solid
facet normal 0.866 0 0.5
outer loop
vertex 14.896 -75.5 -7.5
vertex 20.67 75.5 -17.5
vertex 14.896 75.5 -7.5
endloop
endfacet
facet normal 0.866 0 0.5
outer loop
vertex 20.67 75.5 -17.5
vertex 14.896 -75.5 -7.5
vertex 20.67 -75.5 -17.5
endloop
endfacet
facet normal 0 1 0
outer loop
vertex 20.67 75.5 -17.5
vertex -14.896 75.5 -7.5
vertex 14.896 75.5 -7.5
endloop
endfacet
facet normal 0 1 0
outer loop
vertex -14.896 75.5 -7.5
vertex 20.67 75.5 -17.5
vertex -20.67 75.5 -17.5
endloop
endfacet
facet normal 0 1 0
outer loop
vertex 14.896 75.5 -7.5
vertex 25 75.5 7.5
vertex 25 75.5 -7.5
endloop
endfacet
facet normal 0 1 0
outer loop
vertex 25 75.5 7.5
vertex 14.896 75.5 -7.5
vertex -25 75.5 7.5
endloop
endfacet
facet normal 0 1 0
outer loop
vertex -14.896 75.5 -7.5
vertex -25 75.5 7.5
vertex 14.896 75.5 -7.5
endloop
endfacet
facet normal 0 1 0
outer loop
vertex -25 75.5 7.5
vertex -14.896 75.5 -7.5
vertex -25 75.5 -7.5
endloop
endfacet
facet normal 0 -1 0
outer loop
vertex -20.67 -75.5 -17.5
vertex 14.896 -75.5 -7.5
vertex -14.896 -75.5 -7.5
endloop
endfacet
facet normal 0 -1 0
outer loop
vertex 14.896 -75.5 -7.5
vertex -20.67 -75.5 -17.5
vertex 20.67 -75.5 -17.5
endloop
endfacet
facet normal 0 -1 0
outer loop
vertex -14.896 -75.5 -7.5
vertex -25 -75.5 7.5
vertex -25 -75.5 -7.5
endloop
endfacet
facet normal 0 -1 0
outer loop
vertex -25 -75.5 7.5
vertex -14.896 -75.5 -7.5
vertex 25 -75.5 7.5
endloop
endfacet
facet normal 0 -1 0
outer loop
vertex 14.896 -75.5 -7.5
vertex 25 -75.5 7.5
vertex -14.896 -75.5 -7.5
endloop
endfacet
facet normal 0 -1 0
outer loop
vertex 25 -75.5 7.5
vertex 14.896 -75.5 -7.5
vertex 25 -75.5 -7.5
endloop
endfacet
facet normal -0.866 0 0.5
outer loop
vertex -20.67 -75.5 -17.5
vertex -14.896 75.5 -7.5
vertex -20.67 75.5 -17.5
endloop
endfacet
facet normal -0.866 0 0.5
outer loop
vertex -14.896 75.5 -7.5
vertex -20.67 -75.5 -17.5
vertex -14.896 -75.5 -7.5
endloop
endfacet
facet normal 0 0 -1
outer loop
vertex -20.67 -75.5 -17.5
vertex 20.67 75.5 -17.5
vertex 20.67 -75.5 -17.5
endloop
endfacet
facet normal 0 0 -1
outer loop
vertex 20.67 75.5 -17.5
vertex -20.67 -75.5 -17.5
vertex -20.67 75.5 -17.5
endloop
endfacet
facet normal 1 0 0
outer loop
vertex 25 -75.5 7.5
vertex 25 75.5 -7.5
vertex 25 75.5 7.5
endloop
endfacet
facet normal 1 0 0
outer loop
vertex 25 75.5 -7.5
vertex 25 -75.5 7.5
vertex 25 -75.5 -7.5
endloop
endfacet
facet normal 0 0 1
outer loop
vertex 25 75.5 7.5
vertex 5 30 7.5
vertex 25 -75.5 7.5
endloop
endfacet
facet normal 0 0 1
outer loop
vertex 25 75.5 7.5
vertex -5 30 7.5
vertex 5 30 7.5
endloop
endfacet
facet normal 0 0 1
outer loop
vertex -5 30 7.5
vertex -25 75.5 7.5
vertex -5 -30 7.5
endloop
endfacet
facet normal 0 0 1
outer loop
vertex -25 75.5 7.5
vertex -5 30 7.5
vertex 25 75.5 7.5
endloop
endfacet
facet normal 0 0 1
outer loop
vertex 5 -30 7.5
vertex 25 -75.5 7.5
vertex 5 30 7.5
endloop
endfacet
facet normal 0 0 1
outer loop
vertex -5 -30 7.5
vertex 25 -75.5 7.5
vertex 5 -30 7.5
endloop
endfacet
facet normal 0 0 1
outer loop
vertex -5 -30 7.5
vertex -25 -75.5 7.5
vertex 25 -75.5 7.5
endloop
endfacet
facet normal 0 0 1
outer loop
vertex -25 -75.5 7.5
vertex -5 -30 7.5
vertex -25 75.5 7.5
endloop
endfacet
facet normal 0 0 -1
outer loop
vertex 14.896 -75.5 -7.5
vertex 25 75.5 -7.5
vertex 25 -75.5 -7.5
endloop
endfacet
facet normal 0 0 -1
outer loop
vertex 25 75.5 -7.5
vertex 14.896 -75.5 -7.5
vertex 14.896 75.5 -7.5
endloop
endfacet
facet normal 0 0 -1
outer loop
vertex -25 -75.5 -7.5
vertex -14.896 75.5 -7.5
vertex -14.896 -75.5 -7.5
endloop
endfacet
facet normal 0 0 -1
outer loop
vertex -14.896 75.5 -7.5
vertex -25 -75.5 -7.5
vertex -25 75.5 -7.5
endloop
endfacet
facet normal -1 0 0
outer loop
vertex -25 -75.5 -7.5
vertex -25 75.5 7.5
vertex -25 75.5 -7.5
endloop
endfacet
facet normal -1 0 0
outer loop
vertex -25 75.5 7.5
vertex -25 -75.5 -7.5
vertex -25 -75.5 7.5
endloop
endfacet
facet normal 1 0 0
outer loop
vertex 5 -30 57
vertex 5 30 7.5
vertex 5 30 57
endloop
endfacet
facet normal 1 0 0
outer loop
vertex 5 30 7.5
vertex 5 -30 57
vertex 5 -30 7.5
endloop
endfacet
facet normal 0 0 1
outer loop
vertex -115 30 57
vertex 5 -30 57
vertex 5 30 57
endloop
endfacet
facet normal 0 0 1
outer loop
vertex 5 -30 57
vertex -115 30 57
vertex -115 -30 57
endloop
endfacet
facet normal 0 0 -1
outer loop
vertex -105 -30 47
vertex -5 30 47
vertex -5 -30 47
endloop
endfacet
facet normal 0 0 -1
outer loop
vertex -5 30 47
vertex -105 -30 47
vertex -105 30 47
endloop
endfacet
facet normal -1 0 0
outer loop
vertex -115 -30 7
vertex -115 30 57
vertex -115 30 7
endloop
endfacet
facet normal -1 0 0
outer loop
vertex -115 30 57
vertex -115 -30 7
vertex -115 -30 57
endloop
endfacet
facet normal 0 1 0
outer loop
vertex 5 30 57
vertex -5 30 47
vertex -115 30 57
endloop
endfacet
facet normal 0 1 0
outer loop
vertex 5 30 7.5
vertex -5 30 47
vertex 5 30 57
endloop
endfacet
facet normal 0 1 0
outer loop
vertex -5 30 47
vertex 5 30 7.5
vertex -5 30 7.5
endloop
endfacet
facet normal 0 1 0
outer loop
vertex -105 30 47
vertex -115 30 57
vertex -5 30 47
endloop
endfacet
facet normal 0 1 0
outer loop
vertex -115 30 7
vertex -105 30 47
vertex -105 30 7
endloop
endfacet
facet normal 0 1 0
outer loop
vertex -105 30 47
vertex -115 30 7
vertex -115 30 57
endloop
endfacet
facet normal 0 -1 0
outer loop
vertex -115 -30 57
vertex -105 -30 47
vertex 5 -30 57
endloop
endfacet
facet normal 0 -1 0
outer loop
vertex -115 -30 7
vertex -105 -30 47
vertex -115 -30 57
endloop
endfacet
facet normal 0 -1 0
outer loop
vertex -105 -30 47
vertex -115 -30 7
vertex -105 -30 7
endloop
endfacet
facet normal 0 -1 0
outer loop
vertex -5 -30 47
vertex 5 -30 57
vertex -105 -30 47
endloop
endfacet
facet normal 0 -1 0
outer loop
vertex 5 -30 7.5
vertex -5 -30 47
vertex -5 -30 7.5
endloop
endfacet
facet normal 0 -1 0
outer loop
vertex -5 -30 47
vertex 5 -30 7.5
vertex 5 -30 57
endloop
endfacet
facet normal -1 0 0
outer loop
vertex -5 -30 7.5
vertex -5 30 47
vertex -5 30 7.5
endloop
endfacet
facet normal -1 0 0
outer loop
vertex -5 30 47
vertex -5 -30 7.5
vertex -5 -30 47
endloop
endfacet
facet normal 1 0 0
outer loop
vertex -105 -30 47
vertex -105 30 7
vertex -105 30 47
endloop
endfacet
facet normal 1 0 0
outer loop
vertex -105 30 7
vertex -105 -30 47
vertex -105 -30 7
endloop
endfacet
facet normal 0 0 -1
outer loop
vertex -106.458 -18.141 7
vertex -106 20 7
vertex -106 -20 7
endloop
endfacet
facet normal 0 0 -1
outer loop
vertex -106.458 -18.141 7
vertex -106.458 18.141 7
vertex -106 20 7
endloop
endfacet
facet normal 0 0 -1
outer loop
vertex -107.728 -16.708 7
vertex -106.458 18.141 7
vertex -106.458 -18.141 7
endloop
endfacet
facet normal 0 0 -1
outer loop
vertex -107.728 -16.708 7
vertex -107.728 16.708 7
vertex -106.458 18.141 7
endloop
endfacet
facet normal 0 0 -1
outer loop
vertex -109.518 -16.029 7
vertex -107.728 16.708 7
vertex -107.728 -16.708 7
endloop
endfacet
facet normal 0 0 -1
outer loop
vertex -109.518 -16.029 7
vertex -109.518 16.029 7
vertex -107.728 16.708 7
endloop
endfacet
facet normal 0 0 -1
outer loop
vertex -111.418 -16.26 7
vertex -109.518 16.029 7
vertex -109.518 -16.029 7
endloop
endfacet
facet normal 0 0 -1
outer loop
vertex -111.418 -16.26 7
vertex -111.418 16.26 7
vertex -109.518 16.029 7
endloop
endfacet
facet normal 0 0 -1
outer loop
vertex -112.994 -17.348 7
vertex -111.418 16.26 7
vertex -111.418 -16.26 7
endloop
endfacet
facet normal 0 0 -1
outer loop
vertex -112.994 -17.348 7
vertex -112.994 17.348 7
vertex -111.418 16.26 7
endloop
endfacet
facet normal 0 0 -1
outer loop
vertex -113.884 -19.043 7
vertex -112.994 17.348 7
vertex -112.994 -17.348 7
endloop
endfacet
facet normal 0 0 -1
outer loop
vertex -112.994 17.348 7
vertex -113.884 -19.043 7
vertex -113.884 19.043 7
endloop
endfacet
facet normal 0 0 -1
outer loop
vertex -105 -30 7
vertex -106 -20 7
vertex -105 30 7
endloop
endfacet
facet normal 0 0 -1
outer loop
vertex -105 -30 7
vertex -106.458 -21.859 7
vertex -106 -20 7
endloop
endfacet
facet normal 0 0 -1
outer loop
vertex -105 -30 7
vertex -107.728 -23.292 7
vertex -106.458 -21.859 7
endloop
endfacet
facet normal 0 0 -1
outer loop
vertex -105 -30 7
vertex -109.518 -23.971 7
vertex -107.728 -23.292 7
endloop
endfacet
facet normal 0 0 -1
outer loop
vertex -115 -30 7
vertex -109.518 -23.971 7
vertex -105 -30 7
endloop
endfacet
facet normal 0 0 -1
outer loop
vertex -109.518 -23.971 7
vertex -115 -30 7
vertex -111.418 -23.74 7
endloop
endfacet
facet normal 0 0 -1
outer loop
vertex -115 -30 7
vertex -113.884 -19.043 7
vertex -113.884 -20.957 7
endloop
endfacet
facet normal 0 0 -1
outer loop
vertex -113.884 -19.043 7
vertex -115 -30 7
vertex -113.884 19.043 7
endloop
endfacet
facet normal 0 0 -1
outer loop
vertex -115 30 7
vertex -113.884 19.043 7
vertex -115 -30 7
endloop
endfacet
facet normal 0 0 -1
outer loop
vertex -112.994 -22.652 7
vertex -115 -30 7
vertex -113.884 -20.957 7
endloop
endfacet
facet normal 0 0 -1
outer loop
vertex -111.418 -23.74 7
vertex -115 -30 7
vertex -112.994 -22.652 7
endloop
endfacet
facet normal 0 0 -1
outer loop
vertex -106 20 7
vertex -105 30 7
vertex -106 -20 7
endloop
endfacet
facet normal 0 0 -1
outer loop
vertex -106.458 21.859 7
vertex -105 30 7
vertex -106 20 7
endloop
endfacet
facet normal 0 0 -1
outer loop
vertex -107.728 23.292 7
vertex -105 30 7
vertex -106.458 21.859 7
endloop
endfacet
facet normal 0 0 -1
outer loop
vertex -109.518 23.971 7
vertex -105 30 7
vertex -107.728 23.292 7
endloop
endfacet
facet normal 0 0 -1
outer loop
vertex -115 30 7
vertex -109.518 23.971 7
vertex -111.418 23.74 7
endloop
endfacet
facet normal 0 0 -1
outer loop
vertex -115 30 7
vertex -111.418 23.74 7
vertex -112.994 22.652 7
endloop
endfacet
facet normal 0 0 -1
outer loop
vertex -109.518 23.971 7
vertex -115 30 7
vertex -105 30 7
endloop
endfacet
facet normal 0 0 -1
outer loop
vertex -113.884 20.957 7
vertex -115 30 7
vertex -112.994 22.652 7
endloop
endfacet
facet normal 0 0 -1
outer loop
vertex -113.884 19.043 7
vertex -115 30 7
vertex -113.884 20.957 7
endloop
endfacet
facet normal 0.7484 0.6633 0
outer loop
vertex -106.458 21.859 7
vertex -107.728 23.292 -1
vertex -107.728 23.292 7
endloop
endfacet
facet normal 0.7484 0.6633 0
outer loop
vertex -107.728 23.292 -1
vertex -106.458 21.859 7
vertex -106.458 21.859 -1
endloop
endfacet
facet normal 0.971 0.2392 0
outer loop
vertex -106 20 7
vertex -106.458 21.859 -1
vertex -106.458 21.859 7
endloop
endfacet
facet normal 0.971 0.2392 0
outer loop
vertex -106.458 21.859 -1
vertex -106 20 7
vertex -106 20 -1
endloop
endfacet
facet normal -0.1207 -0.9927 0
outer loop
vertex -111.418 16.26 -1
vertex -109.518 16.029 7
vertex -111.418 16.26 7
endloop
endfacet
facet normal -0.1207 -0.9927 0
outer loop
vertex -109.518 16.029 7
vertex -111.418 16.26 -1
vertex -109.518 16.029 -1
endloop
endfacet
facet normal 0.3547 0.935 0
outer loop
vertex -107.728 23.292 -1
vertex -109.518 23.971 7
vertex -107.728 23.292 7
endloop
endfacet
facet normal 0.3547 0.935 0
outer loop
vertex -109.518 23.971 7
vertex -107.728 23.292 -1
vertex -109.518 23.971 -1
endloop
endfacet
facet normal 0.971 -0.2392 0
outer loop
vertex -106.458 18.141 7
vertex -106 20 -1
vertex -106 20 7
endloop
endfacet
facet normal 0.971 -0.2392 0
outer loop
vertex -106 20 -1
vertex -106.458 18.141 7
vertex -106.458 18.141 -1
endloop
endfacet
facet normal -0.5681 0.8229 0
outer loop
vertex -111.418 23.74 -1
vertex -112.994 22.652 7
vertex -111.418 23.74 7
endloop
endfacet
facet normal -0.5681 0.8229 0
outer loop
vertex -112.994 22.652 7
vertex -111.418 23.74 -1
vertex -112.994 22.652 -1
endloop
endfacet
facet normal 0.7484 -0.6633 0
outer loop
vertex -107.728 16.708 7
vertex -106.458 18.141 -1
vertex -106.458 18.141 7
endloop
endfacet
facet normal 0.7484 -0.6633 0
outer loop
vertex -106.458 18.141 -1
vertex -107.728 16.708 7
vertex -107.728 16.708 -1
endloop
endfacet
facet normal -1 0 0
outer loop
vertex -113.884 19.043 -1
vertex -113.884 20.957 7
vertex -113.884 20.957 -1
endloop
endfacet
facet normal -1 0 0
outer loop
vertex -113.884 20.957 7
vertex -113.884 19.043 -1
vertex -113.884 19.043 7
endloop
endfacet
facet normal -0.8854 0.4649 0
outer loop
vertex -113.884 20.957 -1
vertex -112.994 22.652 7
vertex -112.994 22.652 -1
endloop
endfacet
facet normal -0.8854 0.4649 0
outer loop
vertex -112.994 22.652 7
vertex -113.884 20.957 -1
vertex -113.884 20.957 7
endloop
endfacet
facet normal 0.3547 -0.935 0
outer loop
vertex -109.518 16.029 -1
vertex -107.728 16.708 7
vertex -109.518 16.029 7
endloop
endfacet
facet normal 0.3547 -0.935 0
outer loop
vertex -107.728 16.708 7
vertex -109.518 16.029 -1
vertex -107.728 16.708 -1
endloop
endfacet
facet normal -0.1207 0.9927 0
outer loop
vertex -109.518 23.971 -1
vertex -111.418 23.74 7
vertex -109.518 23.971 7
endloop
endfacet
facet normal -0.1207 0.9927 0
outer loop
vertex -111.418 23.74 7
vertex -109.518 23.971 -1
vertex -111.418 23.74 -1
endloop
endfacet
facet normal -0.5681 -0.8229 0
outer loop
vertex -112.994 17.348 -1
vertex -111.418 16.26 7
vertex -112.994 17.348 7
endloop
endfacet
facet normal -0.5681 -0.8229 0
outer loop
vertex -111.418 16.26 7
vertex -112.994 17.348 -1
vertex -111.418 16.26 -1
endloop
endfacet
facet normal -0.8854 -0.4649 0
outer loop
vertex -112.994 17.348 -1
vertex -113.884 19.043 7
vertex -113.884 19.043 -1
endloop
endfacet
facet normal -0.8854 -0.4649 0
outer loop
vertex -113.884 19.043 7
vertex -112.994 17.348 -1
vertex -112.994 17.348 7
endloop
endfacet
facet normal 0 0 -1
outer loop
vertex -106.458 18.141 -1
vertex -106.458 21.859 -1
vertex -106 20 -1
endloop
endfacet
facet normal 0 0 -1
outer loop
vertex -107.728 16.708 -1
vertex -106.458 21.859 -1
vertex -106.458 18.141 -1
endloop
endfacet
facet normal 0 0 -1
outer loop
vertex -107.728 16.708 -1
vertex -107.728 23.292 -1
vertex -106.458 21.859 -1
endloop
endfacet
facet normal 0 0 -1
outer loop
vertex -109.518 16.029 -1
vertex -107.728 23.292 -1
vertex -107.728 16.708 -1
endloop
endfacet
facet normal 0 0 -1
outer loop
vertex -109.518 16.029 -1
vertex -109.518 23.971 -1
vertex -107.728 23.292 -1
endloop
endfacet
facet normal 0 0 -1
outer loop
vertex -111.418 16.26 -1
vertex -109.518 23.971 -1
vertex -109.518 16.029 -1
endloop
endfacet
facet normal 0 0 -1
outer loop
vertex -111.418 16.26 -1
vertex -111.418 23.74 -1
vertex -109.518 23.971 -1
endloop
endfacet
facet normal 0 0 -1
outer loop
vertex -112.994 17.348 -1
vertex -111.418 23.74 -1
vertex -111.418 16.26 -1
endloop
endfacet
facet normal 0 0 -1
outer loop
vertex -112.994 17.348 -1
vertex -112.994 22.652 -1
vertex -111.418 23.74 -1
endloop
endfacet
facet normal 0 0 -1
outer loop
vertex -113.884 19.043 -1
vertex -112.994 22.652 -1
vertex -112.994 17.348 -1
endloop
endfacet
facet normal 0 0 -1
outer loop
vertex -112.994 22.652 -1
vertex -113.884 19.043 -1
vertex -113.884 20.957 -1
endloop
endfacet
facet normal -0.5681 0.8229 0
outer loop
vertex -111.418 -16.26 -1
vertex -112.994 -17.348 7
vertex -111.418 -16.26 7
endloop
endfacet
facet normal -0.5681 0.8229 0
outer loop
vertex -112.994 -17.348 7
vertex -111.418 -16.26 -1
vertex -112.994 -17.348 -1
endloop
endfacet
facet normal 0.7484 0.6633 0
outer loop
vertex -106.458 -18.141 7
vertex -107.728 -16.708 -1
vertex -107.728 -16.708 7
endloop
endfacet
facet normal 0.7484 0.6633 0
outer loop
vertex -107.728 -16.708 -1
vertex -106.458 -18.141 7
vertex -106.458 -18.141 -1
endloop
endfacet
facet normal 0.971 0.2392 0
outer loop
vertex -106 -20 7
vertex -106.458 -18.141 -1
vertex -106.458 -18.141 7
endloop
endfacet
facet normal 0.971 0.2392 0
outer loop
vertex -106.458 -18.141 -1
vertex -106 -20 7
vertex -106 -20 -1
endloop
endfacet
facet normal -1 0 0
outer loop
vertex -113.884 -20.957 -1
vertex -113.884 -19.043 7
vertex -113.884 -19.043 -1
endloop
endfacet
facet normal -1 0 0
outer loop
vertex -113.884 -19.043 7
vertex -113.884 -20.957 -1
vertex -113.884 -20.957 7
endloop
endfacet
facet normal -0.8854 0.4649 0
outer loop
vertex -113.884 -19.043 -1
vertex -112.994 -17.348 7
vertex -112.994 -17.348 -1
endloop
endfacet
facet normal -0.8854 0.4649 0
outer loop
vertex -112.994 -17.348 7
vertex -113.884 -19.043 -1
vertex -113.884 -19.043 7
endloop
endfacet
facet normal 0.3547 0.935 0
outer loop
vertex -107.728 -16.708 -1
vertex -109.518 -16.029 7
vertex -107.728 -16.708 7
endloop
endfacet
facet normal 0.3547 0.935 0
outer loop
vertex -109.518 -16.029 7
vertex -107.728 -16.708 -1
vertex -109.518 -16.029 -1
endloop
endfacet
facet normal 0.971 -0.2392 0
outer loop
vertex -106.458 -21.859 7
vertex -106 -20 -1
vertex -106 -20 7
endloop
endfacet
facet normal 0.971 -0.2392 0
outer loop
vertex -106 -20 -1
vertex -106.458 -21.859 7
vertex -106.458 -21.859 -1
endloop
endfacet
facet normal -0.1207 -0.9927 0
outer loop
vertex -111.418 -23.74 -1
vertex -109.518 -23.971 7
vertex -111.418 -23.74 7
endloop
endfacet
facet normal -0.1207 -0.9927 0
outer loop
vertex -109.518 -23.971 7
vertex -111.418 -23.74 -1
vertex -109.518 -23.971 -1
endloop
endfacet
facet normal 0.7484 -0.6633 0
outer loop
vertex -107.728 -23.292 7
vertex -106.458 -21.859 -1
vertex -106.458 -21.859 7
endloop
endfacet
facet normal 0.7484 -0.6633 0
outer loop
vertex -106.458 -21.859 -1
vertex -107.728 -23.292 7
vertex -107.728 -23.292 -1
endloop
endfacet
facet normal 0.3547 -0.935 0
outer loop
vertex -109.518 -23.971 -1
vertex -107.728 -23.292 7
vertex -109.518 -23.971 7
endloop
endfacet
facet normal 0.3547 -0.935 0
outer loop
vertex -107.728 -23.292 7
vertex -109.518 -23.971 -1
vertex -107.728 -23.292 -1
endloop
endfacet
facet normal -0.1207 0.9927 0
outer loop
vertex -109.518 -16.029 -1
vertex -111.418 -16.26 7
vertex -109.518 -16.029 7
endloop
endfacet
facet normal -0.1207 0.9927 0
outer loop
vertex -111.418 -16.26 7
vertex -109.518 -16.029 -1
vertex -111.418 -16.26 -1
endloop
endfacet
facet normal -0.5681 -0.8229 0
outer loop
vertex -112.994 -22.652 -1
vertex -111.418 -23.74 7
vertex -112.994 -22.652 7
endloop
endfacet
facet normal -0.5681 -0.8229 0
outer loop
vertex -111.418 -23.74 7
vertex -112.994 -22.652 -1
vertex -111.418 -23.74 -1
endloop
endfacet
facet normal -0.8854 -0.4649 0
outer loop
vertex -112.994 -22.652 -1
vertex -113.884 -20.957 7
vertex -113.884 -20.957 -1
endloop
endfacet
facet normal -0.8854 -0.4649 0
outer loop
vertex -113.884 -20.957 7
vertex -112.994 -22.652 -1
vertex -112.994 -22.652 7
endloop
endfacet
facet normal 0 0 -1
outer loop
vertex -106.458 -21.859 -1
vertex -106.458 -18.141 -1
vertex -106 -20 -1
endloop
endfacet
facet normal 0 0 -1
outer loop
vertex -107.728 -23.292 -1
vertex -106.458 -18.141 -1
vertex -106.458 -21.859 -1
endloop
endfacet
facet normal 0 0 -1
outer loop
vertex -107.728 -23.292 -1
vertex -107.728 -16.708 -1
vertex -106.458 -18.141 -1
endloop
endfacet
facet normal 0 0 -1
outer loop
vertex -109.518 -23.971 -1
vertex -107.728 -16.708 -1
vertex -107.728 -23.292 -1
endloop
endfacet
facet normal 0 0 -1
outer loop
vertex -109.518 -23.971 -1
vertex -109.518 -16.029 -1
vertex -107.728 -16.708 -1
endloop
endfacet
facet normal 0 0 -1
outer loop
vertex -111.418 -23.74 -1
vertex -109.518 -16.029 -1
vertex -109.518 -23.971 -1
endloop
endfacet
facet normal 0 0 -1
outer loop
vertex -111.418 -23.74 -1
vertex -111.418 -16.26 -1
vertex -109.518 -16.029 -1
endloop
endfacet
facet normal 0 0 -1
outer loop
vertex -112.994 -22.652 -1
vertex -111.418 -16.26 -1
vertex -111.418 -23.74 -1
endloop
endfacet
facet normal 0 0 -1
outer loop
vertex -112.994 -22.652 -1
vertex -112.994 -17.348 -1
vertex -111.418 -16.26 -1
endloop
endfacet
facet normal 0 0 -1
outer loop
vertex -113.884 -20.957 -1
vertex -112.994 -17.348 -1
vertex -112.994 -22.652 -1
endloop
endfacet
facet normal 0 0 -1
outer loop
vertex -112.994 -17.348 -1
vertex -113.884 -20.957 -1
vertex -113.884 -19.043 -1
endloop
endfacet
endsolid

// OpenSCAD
module handle(){
    handlebase();
    handletop();
}
module handlebase(){
    difference(){
        union(){
//            translate([-120,0,-10]){
//                cube([10, 230, 10],center = true);
//            }
            translate([0,-0,0]){
                cube([50, 151, 15], center = true);
                handlebaseslide();
            }
        }
        handletop();
    
    }

}
module handletop(){

        union(){
            translate([-55,0,52]){
                cube([120, 60, 10],center = true);
            }
            translate([0,0,27.5]){
                cube([10,60,40],center = true);
            }
            translate([-110,0,30]){
                cube([10,60,46],center = true);
            }
            translate([0,-20,7]){
                cylinder(8, d = 8, center = true);
            }
            translate([0,20,7]){
                cylinder(8, d = 8, center = true);
            }   
            translate([-110, 20,3]){
                cylinder(8, d = 8, center = true);
            }
            translate([-110, -20, 3]){
                cylinder(8, d = 8, center = true);
            }               
        }

}
module handlebaseslide(){
    difference(){
        translate([0, 0, -25]){
            rotate([90,90,0]){
                rotate([0,0,30]){
                    cylinder(151, d = 50, center = true, $fn = 6);
                }
            }
        }
        translate([0,0,-35]){
            cube([50,152, 35], center = true);
        }
    }
}
handle();
